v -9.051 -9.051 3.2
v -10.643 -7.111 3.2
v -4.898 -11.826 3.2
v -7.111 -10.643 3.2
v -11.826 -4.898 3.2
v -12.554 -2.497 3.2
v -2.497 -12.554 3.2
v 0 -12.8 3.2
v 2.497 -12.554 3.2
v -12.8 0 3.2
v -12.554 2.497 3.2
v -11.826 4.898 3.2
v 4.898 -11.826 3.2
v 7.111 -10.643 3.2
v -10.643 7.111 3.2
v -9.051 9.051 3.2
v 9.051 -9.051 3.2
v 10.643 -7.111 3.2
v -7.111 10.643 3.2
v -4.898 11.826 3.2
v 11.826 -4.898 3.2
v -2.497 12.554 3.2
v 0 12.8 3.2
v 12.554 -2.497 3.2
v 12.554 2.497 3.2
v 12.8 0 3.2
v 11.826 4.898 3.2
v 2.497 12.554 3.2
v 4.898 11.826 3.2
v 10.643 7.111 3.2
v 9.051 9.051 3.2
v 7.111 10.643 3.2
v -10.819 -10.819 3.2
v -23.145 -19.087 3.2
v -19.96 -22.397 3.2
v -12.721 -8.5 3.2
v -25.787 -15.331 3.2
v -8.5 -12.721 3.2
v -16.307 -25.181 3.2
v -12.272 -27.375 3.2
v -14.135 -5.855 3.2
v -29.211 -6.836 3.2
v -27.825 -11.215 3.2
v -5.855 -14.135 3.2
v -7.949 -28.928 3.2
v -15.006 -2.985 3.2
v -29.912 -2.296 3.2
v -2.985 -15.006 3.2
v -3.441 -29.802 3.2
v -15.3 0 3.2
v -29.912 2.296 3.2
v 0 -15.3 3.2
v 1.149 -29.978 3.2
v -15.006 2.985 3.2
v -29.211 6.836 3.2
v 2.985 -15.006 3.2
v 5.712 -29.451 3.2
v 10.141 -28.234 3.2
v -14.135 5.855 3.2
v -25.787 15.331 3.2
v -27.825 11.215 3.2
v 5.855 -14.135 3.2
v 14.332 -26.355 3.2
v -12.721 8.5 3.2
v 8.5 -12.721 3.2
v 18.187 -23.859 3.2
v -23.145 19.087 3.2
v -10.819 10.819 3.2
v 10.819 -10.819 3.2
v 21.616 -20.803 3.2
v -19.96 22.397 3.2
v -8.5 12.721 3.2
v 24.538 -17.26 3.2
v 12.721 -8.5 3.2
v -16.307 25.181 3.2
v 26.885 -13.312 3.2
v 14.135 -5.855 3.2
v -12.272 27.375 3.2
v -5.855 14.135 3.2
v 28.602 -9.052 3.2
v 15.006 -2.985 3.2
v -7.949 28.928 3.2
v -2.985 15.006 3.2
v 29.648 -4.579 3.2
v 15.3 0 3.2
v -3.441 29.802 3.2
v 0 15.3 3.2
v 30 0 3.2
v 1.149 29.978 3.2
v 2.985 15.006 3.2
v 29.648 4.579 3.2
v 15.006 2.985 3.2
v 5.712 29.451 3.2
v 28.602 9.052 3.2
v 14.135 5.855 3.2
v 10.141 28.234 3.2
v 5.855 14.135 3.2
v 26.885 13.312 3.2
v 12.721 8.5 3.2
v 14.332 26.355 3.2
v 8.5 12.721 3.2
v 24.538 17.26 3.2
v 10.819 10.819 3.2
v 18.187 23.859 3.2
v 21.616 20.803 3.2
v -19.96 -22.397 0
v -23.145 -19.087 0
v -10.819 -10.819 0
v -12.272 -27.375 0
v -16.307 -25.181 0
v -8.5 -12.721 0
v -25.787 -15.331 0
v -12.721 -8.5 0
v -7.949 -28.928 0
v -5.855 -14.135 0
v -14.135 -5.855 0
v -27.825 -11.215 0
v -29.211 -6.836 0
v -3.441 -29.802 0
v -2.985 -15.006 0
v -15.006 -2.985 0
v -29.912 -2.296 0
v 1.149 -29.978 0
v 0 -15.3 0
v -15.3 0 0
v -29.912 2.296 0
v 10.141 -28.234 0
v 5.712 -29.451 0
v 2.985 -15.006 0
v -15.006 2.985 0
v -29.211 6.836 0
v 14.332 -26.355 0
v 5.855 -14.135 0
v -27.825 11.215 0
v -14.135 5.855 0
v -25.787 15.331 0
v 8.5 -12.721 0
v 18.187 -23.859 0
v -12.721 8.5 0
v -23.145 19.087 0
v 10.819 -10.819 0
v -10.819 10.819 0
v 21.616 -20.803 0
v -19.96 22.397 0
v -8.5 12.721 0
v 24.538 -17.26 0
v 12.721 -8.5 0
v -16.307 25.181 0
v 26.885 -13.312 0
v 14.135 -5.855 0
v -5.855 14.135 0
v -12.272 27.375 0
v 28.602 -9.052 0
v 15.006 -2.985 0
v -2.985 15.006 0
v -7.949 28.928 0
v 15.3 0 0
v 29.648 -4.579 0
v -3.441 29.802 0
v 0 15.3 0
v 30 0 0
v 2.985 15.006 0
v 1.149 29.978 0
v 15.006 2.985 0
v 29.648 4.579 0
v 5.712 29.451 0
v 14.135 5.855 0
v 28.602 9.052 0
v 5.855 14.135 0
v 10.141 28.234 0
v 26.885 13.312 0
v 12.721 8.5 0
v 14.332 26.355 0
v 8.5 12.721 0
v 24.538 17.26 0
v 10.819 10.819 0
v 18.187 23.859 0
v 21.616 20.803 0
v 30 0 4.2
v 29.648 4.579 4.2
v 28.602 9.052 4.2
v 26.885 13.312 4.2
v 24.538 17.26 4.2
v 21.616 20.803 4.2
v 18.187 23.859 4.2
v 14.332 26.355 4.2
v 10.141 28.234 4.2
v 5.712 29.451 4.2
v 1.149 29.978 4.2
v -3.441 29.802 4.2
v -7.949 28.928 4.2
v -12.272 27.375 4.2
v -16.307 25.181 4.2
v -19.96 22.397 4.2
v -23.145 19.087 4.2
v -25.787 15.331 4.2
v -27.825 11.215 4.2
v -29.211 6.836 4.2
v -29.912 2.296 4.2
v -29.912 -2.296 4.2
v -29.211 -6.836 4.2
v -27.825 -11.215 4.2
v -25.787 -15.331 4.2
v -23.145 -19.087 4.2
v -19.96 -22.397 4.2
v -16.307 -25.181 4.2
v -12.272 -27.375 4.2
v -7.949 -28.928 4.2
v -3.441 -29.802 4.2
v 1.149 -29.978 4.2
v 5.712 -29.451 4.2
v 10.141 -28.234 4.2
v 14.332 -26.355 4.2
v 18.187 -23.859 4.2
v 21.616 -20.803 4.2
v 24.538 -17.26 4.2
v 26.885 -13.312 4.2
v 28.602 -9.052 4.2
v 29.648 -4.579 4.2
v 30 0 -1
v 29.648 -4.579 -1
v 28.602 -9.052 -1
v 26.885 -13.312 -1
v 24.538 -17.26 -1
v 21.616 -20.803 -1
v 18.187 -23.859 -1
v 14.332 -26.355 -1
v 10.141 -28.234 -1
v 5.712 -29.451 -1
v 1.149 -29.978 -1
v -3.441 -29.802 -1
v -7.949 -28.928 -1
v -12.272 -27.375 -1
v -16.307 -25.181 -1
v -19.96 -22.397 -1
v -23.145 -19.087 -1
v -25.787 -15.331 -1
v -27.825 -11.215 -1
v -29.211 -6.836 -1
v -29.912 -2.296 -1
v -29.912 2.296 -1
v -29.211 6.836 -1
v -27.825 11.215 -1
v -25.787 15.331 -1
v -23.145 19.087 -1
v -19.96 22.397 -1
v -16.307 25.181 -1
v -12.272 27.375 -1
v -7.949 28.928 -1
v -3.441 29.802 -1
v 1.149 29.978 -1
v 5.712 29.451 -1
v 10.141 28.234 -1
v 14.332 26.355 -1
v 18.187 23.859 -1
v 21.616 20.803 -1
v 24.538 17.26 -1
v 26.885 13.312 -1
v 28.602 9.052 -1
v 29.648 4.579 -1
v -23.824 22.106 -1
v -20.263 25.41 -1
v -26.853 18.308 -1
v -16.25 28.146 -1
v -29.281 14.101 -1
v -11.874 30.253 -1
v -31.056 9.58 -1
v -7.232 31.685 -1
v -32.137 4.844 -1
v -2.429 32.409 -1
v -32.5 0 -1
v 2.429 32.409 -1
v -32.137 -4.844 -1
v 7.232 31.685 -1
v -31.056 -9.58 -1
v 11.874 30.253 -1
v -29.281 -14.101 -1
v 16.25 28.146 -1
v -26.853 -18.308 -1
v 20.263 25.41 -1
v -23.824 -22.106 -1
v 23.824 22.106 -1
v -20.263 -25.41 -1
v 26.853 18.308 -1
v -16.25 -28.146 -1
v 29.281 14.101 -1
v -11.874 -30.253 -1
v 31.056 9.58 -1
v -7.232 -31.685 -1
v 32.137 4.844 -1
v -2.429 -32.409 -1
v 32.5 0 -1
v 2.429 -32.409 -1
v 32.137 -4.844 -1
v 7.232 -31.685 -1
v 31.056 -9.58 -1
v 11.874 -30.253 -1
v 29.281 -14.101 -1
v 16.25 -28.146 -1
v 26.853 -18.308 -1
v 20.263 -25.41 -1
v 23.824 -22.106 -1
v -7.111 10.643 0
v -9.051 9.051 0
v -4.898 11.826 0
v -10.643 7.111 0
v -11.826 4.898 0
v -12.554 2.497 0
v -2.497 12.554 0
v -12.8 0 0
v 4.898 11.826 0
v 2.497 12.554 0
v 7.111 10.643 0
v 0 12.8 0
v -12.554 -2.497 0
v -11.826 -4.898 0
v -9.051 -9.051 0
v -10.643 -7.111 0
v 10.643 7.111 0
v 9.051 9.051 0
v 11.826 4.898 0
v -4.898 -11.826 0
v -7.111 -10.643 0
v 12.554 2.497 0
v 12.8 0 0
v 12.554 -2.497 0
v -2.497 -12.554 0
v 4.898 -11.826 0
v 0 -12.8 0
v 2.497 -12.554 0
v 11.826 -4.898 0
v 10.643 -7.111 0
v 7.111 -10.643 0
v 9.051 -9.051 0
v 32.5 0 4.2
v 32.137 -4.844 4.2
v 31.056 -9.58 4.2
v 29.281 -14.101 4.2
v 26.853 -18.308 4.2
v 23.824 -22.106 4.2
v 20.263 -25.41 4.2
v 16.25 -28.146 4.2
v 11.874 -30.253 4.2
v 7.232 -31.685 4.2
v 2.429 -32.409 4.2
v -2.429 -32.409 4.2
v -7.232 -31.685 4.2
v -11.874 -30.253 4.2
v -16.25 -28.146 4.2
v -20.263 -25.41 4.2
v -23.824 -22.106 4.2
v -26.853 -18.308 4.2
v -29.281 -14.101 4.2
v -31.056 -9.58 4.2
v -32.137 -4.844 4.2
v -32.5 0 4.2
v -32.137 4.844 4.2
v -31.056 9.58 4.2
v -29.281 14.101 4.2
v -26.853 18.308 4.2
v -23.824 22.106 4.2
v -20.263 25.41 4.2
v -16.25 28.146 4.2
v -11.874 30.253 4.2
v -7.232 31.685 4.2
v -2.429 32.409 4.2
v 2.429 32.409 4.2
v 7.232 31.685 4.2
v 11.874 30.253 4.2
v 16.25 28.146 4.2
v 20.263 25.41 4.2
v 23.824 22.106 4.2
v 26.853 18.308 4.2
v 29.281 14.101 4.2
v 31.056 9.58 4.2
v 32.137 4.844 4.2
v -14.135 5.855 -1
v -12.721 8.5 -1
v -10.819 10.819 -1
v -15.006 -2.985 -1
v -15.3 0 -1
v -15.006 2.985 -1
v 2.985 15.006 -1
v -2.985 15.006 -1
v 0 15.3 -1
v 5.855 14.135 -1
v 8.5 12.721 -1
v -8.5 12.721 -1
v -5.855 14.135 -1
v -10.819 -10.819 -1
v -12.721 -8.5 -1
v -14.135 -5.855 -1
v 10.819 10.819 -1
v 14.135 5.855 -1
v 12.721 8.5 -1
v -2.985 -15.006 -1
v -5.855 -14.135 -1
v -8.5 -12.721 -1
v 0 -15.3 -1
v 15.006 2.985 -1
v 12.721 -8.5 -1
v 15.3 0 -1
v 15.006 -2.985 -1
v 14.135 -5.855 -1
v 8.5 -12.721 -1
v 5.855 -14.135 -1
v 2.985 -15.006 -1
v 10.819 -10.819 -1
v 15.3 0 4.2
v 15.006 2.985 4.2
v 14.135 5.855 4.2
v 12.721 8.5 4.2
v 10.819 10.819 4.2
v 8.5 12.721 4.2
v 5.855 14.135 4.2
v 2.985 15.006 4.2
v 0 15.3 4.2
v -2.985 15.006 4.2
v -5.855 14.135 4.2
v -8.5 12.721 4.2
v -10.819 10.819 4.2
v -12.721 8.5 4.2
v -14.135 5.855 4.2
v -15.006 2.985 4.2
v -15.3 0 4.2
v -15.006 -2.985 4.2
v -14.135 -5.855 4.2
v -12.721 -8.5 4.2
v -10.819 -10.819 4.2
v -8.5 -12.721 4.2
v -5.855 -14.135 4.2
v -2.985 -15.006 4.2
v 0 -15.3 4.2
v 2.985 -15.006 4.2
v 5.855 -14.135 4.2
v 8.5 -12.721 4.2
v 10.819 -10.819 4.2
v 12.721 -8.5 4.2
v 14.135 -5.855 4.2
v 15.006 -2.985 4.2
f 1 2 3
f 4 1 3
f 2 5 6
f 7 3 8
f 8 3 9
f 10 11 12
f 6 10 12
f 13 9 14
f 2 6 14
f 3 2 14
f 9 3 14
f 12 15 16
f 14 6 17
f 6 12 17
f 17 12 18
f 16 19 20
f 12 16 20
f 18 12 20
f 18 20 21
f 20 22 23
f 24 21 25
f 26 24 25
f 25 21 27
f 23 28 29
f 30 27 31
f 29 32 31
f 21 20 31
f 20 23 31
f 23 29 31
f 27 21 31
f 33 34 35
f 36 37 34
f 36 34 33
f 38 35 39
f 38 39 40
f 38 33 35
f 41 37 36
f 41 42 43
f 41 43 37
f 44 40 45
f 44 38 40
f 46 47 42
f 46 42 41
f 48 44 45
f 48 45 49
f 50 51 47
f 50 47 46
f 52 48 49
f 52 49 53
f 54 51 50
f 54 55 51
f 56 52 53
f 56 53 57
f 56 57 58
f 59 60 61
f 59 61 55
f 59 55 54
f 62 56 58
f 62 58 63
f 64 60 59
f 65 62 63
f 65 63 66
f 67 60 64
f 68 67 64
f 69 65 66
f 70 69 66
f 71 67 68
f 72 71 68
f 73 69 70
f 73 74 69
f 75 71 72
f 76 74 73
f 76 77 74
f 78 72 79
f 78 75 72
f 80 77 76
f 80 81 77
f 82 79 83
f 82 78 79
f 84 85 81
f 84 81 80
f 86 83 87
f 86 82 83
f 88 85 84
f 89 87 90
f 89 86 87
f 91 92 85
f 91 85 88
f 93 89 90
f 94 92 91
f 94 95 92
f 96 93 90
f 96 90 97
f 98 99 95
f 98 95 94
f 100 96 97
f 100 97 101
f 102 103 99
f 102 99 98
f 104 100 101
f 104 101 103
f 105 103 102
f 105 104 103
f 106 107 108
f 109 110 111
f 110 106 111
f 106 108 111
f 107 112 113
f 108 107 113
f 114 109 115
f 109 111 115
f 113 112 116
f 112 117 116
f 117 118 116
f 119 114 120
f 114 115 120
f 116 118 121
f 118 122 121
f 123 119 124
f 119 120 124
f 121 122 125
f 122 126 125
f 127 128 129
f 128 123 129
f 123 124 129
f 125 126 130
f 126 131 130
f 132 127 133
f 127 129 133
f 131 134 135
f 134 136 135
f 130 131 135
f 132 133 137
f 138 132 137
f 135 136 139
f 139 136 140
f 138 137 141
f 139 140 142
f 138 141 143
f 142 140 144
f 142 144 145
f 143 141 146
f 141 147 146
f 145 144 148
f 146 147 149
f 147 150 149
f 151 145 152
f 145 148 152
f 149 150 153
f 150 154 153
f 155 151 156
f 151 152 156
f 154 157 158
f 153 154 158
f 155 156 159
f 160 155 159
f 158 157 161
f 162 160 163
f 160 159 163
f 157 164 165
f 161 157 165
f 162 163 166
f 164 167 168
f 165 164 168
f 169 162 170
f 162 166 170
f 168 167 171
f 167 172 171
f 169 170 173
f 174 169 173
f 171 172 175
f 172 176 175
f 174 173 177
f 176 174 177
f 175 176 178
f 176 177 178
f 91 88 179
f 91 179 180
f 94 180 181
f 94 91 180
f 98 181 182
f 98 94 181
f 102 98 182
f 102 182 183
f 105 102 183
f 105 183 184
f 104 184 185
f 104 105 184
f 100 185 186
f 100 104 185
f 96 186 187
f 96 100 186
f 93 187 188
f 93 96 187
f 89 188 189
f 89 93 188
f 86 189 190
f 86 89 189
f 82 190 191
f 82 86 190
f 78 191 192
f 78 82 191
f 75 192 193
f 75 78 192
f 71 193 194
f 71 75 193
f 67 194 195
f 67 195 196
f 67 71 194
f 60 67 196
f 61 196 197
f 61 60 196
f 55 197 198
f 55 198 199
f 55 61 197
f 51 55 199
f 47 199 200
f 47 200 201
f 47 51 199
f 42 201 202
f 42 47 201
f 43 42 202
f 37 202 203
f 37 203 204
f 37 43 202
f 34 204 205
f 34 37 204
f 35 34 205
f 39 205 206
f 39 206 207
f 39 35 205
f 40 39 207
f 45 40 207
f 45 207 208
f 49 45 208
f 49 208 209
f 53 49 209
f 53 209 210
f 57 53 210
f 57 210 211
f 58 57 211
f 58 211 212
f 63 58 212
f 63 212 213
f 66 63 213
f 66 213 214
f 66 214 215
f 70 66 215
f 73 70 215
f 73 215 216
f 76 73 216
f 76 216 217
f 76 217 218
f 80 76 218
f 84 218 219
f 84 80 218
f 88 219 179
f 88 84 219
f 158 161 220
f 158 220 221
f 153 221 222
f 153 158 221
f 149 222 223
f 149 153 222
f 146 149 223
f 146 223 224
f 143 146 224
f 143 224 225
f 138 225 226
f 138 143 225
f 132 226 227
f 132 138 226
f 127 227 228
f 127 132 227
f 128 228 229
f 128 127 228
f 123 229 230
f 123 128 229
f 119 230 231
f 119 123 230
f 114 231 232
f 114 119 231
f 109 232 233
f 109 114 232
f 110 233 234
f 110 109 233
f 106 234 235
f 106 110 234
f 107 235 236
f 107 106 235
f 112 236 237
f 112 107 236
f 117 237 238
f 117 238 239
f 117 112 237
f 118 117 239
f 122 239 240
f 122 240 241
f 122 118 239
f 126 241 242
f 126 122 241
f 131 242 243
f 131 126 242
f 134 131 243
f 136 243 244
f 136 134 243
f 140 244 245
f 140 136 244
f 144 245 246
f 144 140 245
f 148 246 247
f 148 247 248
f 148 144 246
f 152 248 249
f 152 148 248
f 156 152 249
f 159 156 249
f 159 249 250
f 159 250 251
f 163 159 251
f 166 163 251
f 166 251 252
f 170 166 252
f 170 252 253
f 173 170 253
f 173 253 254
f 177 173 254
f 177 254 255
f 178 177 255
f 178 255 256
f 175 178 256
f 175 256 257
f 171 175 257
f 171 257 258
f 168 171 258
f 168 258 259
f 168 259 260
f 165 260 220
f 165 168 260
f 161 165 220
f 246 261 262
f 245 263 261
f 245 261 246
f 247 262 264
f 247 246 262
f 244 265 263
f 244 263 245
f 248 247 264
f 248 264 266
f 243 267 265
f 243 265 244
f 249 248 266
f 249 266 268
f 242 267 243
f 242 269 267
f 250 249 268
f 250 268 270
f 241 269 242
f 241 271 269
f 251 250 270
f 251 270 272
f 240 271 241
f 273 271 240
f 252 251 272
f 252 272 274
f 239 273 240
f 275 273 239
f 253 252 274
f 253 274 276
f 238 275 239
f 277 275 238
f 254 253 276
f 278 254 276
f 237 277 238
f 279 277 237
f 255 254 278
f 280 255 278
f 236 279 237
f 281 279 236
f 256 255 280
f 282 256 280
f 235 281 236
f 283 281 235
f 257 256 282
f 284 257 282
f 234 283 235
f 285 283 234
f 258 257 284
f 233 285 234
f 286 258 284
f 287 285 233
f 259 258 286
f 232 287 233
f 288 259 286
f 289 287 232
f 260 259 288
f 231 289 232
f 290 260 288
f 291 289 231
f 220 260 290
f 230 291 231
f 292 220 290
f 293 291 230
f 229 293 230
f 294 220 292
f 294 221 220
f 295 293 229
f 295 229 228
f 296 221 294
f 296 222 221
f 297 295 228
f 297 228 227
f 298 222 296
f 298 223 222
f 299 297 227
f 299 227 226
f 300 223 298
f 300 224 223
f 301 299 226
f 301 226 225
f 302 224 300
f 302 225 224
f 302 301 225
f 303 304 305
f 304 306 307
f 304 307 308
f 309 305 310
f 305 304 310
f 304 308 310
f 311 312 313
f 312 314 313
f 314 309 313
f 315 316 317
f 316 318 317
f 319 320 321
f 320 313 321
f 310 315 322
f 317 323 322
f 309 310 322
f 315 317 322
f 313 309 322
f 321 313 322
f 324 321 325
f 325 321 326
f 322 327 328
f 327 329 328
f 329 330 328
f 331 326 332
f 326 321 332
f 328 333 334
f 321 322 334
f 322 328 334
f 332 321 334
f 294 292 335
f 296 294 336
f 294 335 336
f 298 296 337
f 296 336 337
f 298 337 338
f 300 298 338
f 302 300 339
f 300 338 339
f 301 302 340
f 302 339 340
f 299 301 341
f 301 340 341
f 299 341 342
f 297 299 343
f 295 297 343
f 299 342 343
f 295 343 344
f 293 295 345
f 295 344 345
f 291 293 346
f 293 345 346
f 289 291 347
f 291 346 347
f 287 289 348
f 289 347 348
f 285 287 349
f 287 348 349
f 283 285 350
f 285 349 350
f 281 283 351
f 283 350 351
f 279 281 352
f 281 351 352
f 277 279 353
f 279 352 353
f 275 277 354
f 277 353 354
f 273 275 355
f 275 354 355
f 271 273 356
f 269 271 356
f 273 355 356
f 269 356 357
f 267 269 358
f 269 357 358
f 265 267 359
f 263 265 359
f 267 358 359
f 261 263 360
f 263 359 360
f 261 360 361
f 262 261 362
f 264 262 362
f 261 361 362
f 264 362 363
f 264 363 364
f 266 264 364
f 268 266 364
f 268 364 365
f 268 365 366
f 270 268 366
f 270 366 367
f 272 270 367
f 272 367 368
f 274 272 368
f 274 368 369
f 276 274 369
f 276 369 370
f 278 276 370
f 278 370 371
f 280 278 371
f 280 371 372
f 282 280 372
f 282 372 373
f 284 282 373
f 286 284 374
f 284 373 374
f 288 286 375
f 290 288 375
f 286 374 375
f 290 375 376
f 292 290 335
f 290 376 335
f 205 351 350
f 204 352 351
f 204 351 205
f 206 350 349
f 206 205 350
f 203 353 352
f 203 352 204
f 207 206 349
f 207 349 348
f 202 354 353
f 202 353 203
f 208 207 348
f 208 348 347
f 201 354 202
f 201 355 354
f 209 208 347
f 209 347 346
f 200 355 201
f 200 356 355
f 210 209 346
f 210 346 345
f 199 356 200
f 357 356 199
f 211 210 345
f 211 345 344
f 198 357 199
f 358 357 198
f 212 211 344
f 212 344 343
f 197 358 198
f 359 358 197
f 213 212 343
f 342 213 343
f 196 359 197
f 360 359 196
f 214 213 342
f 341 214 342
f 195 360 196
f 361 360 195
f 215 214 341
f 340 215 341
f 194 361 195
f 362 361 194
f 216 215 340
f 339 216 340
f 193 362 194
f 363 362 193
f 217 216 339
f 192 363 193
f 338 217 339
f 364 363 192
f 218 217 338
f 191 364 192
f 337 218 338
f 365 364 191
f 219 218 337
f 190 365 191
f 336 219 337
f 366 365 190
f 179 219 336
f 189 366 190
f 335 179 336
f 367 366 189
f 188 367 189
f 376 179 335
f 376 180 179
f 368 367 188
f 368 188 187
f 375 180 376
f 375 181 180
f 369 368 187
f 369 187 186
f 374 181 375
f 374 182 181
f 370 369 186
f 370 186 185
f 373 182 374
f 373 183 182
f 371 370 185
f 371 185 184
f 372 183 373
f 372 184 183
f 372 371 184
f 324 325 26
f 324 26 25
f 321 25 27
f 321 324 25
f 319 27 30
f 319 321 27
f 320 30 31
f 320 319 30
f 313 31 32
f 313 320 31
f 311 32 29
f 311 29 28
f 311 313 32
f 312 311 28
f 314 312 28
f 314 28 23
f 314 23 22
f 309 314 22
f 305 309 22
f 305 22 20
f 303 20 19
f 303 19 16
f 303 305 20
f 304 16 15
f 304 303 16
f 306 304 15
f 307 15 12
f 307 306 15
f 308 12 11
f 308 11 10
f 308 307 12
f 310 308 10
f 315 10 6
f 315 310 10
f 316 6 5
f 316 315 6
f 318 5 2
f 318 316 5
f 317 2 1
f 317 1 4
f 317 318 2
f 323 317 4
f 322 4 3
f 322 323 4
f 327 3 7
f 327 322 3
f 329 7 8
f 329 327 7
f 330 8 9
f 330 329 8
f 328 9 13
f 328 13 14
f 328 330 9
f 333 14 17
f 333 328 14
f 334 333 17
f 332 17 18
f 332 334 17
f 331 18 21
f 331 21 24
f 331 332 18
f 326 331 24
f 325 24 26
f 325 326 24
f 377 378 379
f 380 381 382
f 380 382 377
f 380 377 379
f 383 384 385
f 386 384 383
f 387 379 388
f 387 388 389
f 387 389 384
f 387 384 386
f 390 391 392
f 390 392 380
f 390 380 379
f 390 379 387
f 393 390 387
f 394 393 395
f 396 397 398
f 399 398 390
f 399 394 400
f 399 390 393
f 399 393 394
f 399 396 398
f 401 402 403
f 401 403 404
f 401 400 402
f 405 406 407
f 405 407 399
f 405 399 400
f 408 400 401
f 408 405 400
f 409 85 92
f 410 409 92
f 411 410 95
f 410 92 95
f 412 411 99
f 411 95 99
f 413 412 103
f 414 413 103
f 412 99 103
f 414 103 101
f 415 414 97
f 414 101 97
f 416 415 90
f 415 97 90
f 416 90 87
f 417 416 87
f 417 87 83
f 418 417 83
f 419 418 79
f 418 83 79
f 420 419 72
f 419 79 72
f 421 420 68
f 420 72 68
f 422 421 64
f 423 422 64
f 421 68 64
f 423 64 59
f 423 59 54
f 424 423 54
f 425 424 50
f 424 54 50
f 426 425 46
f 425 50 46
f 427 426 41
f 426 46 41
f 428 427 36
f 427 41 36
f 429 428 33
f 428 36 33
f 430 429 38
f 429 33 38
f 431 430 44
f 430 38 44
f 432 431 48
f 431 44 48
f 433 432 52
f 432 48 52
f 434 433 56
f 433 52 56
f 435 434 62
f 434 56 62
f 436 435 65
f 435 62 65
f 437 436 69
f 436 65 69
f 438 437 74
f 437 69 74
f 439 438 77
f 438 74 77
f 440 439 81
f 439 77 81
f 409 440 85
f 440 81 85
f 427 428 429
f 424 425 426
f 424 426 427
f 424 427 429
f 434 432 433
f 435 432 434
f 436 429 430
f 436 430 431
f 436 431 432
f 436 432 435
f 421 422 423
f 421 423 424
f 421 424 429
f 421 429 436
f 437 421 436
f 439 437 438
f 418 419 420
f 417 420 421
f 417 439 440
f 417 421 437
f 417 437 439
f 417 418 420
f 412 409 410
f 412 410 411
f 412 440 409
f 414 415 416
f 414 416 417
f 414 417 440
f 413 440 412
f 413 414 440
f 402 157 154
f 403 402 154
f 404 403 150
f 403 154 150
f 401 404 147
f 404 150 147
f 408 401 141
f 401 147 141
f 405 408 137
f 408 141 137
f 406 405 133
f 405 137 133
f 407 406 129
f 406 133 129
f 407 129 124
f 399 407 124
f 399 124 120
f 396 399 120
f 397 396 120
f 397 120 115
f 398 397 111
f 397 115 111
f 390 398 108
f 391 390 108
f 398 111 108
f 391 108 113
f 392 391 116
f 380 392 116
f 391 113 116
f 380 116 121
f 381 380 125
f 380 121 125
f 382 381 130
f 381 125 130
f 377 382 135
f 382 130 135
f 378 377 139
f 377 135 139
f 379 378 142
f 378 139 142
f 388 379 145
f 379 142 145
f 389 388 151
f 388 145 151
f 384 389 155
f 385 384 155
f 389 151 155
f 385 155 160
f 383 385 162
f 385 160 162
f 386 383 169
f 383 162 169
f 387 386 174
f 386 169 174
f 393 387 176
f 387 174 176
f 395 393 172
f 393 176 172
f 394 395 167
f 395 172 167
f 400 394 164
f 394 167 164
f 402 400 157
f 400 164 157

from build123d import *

# Parameters (mm, degrees)
SKETCH_R      = 32.5
SKETCH_R_2    = 12.8
PAD_DEPTH     = 3.2
SKETCH001_R   = 32.5
SKETCH001_R_2 = 30
SKETCH001_R_3 = 15.3
PAD001_DEPTH  = 1
SKETCH002_R   = 32.5
SKETCH002_R_2 = 30
SKETCH002_R_3 = 15.3
PAD002_DEPTH  = 1


with BuildPart() as part:
    # Sketch → Pad (new body)
    with BuildSketch(Plane.XY):
        Circle(SKETCH_R)
        Circle(SKETCH_R_2, mode=Mode.SUBTRACT)
    extrude(amount=PAD_DEPTH)

    # Sketch001 (on Face4 of Pad) → Pad001 (join)
    with BuildSketch(Plane.XY.offset(3.2)):
        Circle(SKETCH001_R)
        Circle(SKETCH001_R_2, mode=Mode.SUBTRACT)
        Circle(SKETCH001_R_3)
    extrude(amount=PAD001_DEPTH)

    # Sketch002 (on Face2 of Pad001) → Pad002 (join)
    with BuildSketch(Plane(origin=(0, 0, 0), x_dir=(1, 0, 0), z_dir=(0, 0, -1))):
        Circle(SKETCH002_R)
        Circle(SKETCH002_R_2, mode=Mode.SUBTRACT)
        Circle(SKETCH002_R_3)
    extrude(amount=PAD002_DEPTH)


solid = part.part
